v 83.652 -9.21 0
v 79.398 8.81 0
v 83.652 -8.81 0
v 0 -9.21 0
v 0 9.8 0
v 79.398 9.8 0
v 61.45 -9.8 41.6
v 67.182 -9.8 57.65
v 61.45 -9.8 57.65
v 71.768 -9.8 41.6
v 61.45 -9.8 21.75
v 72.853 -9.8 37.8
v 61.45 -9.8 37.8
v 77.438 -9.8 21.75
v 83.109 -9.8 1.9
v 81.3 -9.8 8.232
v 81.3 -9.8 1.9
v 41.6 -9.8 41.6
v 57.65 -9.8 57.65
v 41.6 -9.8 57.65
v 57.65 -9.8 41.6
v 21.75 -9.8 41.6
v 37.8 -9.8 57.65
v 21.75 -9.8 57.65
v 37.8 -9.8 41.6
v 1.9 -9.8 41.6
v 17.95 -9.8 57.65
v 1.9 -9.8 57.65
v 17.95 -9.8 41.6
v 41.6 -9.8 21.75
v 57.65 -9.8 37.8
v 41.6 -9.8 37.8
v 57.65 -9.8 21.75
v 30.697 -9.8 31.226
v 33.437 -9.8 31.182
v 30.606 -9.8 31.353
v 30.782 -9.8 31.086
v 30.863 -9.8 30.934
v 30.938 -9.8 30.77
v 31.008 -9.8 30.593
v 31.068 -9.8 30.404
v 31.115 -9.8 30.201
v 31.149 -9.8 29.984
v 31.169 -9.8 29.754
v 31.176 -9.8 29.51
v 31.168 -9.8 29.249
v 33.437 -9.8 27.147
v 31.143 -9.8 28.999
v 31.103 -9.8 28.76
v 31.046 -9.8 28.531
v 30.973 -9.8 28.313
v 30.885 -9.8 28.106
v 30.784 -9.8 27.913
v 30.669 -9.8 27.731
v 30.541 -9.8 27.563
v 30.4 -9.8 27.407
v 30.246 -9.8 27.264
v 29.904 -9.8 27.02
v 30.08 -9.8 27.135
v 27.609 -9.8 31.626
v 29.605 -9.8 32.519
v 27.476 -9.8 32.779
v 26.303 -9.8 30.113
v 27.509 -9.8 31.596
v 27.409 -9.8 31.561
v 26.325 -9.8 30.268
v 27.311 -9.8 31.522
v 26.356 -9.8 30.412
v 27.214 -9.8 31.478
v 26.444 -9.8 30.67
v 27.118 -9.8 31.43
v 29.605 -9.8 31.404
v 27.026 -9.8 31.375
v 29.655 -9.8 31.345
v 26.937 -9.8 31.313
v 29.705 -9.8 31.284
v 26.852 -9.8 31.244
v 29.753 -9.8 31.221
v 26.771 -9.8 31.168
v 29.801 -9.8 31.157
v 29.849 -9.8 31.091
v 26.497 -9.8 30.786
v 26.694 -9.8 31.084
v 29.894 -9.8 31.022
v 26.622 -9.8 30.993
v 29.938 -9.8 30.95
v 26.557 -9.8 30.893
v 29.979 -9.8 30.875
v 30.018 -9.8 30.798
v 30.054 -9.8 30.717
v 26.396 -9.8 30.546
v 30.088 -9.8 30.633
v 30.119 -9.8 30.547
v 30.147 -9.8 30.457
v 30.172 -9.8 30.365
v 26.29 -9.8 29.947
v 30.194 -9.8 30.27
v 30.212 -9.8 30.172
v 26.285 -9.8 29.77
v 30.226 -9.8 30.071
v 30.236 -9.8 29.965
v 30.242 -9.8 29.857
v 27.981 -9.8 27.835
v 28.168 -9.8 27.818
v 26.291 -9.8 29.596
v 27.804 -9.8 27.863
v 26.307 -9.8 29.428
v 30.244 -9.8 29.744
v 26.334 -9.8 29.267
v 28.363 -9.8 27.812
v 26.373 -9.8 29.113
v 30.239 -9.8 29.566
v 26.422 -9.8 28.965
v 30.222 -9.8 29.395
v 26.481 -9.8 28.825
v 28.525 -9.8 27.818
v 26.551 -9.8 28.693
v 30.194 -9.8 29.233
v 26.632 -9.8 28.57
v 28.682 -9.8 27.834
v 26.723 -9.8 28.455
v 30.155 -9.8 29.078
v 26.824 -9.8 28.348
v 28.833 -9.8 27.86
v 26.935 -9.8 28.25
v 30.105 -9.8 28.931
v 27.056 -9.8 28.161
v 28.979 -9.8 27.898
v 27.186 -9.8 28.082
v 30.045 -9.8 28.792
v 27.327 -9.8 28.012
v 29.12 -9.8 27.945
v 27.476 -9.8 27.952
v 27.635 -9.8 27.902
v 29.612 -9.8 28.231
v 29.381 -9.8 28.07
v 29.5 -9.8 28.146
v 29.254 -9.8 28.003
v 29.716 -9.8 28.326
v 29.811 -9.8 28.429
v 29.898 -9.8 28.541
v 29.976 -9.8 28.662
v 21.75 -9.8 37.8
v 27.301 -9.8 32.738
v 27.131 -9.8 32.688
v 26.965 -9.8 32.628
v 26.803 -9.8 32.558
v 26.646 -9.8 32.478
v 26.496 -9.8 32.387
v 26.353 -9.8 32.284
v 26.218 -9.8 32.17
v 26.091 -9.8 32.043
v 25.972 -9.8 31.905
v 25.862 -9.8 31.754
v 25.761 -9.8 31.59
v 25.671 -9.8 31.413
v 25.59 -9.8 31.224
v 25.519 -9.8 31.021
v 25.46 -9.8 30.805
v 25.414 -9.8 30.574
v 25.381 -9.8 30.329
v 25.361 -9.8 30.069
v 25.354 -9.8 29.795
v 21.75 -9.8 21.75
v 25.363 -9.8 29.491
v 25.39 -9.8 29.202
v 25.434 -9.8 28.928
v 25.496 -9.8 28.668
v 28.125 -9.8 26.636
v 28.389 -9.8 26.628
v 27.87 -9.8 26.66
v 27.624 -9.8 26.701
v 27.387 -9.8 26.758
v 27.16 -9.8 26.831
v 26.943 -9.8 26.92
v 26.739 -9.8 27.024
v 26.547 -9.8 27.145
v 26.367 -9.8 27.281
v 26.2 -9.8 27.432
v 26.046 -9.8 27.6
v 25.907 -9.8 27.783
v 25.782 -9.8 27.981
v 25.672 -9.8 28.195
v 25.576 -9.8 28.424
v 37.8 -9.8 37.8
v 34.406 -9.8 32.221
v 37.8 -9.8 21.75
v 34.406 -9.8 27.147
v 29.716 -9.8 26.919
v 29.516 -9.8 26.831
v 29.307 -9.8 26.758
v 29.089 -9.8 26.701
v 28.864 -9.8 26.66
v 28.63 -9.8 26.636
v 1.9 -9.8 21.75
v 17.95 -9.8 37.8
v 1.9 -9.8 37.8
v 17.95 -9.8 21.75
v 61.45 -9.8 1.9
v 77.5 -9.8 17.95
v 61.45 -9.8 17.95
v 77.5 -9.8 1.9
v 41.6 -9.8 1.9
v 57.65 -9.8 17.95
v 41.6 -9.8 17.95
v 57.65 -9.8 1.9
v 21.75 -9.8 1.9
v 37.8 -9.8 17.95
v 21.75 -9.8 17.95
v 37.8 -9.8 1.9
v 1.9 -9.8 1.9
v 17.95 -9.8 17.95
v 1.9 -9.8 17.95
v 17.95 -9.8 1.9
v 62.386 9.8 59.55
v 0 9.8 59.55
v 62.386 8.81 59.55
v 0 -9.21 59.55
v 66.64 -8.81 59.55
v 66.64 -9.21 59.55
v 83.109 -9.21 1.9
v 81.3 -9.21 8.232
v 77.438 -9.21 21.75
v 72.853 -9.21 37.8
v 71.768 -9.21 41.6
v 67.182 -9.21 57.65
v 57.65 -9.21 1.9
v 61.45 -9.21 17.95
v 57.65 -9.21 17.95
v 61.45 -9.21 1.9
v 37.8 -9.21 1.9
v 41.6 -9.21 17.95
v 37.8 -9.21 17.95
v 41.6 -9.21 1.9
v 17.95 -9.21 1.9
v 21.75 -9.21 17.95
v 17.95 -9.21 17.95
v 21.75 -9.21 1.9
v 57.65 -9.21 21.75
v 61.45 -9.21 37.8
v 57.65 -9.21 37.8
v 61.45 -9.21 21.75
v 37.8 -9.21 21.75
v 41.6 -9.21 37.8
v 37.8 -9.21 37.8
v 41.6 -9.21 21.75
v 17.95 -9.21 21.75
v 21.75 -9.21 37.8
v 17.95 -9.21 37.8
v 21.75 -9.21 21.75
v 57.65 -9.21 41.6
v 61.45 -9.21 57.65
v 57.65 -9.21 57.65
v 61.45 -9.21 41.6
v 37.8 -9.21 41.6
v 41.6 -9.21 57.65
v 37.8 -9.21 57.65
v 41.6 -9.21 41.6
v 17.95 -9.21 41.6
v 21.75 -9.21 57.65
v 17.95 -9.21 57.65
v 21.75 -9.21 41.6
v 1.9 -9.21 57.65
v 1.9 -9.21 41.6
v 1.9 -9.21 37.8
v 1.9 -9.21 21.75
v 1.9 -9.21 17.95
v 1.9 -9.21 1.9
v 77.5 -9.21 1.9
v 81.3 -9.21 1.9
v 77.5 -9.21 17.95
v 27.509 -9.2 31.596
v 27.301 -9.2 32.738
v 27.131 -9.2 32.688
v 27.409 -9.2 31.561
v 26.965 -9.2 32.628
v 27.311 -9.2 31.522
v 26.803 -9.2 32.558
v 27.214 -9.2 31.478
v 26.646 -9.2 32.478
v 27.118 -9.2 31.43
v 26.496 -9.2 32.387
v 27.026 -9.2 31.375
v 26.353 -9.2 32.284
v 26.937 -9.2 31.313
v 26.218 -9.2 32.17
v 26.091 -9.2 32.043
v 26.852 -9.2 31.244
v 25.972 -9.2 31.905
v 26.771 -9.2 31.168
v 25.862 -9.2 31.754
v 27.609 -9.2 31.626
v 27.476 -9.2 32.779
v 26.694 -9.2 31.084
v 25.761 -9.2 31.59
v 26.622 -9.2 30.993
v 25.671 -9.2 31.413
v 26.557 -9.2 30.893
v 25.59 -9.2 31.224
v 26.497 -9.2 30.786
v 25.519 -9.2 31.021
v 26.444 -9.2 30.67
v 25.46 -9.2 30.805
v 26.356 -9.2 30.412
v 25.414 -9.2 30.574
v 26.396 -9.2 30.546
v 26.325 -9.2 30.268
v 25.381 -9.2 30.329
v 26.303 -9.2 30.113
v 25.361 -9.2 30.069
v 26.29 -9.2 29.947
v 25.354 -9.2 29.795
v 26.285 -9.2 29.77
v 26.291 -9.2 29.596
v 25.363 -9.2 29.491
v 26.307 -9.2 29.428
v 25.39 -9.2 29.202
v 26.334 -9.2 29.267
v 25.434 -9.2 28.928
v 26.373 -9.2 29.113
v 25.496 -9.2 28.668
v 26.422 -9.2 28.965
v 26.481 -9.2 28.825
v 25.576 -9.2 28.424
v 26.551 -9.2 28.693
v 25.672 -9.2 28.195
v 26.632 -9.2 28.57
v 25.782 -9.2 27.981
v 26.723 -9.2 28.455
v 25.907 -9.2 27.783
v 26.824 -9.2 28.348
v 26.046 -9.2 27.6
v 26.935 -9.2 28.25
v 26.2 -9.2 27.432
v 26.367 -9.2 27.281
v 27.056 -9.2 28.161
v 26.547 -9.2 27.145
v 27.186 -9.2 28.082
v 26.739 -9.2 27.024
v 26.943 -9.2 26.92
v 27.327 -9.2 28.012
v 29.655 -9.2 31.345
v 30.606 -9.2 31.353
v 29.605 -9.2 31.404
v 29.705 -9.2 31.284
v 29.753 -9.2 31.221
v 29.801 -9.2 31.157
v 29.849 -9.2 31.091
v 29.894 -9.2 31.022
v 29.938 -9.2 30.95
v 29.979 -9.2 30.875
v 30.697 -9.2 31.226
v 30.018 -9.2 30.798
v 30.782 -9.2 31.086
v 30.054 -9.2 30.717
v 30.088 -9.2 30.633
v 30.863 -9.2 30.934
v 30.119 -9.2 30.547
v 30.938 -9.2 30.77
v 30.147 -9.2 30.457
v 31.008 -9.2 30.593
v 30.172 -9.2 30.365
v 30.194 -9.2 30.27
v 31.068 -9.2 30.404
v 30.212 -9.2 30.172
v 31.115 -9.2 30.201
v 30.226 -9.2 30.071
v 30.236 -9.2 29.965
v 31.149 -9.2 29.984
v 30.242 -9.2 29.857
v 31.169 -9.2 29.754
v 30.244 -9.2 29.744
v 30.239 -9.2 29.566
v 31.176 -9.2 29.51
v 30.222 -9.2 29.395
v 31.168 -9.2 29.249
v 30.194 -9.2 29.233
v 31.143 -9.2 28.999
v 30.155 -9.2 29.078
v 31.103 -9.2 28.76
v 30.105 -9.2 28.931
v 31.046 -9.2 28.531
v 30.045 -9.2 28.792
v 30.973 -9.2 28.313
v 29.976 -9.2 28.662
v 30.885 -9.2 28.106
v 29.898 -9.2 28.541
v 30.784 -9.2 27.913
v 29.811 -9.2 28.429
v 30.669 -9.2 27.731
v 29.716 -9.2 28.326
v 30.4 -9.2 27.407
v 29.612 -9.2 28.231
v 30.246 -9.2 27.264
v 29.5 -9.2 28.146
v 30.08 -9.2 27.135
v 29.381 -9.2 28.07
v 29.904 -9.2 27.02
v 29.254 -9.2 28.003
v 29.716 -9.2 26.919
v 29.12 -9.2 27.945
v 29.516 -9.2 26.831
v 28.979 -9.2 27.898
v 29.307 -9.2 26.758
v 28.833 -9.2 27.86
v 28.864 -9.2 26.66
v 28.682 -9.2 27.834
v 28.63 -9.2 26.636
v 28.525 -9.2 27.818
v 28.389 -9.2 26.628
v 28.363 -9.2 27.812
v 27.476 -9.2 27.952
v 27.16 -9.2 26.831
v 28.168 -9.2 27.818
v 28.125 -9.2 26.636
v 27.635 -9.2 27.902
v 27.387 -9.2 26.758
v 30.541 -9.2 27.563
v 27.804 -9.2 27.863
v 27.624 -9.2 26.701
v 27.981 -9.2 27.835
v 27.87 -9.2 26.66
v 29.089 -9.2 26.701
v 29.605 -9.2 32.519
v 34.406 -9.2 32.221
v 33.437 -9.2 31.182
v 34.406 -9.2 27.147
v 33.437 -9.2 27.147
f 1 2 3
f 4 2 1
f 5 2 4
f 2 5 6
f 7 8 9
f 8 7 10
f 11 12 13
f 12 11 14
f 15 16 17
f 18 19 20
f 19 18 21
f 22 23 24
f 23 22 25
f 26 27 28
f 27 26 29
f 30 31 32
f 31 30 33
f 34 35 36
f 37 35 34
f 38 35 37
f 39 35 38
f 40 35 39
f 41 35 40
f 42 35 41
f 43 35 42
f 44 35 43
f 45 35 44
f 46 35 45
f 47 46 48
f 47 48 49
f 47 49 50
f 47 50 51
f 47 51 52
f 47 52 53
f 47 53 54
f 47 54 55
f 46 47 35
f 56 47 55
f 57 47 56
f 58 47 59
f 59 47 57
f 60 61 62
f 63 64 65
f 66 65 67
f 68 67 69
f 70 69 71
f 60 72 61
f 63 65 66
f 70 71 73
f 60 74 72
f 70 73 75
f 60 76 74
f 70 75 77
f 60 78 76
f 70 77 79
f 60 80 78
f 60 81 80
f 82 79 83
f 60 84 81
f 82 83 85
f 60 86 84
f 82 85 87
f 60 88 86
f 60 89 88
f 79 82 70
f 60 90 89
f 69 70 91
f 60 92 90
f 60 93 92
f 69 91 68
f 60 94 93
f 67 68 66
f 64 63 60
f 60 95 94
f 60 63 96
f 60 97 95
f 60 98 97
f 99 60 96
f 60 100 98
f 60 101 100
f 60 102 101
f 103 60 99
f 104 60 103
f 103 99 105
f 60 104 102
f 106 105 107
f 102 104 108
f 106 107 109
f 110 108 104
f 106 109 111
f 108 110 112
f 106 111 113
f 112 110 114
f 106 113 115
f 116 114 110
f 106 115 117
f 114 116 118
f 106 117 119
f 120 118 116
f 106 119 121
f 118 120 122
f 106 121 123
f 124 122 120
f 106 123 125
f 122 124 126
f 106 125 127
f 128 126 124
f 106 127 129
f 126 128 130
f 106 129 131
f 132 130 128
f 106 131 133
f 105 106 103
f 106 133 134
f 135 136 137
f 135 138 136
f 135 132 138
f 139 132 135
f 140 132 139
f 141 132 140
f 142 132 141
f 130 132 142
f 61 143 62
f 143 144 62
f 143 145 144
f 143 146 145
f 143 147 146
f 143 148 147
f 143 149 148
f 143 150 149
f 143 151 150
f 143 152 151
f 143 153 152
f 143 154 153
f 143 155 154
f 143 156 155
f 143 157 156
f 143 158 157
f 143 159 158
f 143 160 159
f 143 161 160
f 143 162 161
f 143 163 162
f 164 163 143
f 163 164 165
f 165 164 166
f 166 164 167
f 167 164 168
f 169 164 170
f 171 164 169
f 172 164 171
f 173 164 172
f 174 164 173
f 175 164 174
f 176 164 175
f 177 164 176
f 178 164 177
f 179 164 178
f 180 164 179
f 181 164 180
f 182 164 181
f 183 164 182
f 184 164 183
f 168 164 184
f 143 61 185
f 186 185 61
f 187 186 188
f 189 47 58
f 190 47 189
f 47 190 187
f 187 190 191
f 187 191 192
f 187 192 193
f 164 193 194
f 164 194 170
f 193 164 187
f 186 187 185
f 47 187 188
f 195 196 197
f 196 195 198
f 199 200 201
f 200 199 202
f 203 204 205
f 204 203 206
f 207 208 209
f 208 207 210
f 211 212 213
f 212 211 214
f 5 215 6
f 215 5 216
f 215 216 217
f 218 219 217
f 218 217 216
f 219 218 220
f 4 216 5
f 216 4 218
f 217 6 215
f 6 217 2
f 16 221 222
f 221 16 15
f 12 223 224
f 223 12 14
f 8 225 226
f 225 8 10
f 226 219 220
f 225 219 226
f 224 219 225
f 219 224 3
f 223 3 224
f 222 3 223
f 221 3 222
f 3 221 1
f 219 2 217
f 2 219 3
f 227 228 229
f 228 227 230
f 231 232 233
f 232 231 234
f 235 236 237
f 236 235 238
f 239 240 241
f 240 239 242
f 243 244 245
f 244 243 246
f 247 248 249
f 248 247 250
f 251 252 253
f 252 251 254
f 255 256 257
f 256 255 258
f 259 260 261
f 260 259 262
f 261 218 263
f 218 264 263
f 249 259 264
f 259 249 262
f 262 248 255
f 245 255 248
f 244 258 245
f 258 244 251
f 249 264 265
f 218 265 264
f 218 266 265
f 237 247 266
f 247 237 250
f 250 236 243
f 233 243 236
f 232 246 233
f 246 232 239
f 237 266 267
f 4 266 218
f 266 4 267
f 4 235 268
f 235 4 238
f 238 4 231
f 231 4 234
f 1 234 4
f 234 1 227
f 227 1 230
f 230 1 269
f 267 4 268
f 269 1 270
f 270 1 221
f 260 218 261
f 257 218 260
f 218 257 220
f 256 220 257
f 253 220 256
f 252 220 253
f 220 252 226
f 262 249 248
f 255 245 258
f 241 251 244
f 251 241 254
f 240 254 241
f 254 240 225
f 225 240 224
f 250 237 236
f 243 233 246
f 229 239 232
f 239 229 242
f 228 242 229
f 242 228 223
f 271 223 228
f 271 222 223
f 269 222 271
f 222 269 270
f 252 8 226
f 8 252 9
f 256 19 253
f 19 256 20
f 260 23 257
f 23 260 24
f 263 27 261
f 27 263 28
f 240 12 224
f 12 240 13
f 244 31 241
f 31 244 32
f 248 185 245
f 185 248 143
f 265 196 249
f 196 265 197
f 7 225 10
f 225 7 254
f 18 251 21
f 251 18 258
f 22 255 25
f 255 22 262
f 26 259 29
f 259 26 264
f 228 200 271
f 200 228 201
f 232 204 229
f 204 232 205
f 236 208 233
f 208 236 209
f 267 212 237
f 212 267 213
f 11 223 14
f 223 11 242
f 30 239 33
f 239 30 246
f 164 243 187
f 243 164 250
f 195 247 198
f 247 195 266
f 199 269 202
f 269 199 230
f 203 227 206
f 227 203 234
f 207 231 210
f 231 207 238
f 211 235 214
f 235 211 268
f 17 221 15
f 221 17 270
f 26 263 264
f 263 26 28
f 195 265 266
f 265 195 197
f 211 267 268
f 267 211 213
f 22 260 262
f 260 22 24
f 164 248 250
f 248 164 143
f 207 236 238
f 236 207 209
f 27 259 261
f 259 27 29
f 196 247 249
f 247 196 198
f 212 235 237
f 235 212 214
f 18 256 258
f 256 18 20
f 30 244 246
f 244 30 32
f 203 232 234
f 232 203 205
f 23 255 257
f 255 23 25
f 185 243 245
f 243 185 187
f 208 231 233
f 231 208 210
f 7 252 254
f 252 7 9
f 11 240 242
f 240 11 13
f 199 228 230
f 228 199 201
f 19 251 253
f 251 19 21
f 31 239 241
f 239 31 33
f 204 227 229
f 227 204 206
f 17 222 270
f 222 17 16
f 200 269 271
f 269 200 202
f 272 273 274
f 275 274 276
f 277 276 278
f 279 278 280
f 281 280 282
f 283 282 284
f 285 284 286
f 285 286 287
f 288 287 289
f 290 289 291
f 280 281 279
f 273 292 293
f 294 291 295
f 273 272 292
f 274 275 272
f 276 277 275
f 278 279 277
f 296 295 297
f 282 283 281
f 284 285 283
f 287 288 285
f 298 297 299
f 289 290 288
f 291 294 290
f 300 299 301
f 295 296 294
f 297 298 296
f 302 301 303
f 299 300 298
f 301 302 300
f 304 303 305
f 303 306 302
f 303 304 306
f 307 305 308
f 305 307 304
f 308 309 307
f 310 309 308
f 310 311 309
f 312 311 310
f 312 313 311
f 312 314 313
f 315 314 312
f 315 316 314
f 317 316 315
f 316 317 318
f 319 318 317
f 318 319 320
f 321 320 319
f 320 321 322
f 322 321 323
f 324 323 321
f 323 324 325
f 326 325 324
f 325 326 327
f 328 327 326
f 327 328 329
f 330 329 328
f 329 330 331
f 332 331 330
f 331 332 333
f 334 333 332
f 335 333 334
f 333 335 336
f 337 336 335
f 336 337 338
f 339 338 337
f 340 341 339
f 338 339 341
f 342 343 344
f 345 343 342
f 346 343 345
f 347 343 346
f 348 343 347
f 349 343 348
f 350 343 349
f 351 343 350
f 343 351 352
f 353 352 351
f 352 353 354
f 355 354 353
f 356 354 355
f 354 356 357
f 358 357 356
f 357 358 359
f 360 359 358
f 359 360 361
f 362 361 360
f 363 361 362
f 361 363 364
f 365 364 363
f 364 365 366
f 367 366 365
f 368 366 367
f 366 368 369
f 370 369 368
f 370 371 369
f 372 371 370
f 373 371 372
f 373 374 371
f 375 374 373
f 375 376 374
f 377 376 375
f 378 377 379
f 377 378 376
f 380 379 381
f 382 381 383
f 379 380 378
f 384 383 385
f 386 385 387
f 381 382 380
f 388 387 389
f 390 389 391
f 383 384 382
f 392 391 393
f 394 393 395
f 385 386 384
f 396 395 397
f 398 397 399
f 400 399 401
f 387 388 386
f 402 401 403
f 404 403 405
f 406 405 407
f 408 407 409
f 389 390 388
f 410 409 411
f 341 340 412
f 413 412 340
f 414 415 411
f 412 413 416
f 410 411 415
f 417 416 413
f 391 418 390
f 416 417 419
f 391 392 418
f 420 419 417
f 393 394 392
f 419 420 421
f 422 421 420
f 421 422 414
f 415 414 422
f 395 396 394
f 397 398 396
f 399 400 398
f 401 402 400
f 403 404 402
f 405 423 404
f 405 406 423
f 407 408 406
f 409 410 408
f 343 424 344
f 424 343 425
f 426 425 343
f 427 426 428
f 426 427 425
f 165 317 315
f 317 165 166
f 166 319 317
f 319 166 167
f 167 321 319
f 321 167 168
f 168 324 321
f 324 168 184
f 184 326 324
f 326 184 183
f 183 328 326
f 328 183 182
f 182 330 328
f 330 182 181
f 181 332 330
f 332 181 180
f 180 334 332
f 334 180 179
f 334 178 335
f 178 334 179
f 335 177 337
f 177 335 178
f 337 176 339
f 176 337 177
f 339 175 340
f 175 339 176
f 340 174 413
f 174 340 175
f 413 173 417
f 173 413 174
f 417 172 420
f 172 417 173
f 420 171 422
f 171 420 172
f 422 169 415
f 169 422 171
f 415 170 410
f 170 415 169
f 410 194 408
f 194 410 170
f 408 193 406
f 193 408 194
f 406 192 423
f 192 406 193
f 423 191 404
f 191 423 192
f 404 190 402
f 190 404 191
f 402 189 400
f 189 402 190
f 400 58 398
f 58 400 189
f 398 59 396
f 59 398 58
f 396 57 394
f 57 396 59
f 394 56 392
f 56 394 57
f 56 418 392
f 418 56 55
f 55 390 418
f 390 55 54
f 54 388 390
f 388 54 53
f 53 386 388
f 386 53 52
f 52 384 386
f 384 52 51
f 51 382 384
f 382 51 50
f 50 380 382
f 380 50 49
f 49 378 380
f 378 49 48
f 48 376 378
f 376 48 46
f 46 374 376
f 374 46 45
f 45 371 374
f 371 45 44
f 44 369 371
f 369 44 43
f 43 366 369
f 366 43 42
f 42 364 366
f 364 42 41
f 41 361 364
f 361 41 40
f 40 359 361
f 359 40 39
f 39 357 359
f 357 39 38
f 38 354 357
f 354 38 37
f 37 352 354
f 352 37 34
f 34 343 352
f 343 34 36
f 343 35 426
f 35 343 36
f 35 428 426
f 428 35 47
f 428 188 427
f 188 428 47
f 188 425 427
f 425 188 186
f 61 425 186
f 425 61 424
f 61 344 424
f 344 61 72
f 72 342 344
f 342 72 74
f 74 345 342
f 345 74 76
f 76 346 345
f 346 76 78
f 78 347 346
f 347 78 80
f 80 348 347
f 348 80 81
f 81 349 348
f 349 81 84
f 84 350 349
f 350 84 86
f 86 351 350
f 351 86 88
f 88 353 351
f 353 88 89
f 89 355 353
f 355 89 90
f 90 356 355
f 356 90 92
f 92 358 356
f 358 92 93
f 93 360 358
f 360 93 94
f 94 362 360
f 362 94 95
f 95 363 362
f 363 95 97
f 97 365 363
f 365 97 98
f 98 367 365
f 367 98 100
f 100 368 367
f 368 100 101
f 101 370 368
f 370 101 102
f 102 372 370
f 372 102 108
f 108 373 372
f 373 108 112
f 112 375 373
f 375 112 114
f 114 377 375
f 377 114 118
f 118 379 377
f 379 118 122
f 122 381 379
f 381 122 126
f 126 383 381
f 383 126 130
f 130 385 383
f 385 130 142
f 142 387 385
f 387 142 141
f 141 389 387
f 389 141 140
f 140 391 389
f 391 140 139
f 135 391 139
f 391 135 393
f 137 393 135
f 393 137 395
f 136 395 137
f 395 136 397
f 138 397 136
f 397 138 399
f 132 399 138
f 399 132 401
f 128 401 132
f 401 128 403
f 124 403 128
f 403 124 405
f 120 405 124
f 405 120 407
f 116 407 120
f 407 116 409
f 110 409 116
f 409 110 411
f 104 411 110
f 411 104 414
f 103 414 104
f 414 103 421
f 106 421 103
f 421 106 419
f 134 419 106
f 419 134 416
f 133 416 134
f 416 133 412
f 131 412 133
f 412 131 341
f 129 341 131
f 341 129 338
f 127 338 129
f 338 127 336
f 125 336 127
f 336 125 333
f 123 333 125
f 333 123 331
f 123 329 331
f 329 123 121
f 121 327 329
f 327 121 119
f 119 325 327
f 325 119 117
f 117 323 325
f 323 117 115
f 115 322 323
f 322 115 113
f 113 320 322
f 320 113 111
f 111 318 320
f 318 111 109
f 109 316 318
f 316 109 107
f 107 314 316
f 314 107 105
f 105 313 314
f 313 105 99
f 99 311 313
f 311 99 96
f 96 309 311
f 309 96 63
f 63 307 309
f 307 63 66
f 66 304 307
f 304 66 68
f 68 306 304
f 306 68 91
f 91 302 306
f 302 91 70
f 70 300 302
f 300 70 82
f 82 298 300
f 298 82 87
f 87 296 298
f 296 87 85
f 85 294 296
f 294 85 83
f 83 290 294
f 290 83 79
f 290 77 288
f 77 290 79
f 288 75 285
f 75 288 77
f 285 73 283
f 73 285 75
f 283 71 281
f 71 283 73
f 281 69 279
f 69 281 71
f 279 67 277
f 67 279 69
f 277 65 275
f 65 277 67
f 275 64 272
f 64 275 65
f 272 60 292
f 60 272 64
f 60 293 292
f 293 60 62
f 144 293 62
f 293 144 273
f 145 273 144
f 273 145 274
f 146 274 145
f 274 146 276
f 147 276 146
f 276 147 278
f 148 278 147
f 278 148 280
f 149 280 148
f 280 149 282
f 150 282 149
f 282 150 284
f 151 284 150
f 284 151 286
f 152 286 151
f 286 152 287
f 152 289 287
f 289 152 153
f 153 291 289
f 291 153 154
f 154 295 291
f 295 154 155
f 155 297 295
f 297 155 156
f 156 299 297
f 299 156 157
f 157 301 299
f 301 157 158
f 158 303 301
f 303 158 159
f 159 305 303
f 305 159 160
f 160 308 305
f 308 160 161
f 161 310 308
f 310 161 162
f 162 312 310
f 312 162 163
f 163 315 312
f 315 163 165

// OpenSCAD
/*

  puzzle_part_5.scad

  Winston Freer Tile Puzzle: Part 5
      
  (c) olikraus@gmail.com

  This work is licensed under the Creative Commons Attribution-NonCommercial-ShareAlike 4.0 International License. 
  To view a copy of this license, visit http://creativecommons.org/licenses/by-nc-sa/4.0/.
    
*/

include <winston_freer.scad>;


rotate([0,90,-90]) 
translate([-6*ts,-ts,0]) 
part5();
